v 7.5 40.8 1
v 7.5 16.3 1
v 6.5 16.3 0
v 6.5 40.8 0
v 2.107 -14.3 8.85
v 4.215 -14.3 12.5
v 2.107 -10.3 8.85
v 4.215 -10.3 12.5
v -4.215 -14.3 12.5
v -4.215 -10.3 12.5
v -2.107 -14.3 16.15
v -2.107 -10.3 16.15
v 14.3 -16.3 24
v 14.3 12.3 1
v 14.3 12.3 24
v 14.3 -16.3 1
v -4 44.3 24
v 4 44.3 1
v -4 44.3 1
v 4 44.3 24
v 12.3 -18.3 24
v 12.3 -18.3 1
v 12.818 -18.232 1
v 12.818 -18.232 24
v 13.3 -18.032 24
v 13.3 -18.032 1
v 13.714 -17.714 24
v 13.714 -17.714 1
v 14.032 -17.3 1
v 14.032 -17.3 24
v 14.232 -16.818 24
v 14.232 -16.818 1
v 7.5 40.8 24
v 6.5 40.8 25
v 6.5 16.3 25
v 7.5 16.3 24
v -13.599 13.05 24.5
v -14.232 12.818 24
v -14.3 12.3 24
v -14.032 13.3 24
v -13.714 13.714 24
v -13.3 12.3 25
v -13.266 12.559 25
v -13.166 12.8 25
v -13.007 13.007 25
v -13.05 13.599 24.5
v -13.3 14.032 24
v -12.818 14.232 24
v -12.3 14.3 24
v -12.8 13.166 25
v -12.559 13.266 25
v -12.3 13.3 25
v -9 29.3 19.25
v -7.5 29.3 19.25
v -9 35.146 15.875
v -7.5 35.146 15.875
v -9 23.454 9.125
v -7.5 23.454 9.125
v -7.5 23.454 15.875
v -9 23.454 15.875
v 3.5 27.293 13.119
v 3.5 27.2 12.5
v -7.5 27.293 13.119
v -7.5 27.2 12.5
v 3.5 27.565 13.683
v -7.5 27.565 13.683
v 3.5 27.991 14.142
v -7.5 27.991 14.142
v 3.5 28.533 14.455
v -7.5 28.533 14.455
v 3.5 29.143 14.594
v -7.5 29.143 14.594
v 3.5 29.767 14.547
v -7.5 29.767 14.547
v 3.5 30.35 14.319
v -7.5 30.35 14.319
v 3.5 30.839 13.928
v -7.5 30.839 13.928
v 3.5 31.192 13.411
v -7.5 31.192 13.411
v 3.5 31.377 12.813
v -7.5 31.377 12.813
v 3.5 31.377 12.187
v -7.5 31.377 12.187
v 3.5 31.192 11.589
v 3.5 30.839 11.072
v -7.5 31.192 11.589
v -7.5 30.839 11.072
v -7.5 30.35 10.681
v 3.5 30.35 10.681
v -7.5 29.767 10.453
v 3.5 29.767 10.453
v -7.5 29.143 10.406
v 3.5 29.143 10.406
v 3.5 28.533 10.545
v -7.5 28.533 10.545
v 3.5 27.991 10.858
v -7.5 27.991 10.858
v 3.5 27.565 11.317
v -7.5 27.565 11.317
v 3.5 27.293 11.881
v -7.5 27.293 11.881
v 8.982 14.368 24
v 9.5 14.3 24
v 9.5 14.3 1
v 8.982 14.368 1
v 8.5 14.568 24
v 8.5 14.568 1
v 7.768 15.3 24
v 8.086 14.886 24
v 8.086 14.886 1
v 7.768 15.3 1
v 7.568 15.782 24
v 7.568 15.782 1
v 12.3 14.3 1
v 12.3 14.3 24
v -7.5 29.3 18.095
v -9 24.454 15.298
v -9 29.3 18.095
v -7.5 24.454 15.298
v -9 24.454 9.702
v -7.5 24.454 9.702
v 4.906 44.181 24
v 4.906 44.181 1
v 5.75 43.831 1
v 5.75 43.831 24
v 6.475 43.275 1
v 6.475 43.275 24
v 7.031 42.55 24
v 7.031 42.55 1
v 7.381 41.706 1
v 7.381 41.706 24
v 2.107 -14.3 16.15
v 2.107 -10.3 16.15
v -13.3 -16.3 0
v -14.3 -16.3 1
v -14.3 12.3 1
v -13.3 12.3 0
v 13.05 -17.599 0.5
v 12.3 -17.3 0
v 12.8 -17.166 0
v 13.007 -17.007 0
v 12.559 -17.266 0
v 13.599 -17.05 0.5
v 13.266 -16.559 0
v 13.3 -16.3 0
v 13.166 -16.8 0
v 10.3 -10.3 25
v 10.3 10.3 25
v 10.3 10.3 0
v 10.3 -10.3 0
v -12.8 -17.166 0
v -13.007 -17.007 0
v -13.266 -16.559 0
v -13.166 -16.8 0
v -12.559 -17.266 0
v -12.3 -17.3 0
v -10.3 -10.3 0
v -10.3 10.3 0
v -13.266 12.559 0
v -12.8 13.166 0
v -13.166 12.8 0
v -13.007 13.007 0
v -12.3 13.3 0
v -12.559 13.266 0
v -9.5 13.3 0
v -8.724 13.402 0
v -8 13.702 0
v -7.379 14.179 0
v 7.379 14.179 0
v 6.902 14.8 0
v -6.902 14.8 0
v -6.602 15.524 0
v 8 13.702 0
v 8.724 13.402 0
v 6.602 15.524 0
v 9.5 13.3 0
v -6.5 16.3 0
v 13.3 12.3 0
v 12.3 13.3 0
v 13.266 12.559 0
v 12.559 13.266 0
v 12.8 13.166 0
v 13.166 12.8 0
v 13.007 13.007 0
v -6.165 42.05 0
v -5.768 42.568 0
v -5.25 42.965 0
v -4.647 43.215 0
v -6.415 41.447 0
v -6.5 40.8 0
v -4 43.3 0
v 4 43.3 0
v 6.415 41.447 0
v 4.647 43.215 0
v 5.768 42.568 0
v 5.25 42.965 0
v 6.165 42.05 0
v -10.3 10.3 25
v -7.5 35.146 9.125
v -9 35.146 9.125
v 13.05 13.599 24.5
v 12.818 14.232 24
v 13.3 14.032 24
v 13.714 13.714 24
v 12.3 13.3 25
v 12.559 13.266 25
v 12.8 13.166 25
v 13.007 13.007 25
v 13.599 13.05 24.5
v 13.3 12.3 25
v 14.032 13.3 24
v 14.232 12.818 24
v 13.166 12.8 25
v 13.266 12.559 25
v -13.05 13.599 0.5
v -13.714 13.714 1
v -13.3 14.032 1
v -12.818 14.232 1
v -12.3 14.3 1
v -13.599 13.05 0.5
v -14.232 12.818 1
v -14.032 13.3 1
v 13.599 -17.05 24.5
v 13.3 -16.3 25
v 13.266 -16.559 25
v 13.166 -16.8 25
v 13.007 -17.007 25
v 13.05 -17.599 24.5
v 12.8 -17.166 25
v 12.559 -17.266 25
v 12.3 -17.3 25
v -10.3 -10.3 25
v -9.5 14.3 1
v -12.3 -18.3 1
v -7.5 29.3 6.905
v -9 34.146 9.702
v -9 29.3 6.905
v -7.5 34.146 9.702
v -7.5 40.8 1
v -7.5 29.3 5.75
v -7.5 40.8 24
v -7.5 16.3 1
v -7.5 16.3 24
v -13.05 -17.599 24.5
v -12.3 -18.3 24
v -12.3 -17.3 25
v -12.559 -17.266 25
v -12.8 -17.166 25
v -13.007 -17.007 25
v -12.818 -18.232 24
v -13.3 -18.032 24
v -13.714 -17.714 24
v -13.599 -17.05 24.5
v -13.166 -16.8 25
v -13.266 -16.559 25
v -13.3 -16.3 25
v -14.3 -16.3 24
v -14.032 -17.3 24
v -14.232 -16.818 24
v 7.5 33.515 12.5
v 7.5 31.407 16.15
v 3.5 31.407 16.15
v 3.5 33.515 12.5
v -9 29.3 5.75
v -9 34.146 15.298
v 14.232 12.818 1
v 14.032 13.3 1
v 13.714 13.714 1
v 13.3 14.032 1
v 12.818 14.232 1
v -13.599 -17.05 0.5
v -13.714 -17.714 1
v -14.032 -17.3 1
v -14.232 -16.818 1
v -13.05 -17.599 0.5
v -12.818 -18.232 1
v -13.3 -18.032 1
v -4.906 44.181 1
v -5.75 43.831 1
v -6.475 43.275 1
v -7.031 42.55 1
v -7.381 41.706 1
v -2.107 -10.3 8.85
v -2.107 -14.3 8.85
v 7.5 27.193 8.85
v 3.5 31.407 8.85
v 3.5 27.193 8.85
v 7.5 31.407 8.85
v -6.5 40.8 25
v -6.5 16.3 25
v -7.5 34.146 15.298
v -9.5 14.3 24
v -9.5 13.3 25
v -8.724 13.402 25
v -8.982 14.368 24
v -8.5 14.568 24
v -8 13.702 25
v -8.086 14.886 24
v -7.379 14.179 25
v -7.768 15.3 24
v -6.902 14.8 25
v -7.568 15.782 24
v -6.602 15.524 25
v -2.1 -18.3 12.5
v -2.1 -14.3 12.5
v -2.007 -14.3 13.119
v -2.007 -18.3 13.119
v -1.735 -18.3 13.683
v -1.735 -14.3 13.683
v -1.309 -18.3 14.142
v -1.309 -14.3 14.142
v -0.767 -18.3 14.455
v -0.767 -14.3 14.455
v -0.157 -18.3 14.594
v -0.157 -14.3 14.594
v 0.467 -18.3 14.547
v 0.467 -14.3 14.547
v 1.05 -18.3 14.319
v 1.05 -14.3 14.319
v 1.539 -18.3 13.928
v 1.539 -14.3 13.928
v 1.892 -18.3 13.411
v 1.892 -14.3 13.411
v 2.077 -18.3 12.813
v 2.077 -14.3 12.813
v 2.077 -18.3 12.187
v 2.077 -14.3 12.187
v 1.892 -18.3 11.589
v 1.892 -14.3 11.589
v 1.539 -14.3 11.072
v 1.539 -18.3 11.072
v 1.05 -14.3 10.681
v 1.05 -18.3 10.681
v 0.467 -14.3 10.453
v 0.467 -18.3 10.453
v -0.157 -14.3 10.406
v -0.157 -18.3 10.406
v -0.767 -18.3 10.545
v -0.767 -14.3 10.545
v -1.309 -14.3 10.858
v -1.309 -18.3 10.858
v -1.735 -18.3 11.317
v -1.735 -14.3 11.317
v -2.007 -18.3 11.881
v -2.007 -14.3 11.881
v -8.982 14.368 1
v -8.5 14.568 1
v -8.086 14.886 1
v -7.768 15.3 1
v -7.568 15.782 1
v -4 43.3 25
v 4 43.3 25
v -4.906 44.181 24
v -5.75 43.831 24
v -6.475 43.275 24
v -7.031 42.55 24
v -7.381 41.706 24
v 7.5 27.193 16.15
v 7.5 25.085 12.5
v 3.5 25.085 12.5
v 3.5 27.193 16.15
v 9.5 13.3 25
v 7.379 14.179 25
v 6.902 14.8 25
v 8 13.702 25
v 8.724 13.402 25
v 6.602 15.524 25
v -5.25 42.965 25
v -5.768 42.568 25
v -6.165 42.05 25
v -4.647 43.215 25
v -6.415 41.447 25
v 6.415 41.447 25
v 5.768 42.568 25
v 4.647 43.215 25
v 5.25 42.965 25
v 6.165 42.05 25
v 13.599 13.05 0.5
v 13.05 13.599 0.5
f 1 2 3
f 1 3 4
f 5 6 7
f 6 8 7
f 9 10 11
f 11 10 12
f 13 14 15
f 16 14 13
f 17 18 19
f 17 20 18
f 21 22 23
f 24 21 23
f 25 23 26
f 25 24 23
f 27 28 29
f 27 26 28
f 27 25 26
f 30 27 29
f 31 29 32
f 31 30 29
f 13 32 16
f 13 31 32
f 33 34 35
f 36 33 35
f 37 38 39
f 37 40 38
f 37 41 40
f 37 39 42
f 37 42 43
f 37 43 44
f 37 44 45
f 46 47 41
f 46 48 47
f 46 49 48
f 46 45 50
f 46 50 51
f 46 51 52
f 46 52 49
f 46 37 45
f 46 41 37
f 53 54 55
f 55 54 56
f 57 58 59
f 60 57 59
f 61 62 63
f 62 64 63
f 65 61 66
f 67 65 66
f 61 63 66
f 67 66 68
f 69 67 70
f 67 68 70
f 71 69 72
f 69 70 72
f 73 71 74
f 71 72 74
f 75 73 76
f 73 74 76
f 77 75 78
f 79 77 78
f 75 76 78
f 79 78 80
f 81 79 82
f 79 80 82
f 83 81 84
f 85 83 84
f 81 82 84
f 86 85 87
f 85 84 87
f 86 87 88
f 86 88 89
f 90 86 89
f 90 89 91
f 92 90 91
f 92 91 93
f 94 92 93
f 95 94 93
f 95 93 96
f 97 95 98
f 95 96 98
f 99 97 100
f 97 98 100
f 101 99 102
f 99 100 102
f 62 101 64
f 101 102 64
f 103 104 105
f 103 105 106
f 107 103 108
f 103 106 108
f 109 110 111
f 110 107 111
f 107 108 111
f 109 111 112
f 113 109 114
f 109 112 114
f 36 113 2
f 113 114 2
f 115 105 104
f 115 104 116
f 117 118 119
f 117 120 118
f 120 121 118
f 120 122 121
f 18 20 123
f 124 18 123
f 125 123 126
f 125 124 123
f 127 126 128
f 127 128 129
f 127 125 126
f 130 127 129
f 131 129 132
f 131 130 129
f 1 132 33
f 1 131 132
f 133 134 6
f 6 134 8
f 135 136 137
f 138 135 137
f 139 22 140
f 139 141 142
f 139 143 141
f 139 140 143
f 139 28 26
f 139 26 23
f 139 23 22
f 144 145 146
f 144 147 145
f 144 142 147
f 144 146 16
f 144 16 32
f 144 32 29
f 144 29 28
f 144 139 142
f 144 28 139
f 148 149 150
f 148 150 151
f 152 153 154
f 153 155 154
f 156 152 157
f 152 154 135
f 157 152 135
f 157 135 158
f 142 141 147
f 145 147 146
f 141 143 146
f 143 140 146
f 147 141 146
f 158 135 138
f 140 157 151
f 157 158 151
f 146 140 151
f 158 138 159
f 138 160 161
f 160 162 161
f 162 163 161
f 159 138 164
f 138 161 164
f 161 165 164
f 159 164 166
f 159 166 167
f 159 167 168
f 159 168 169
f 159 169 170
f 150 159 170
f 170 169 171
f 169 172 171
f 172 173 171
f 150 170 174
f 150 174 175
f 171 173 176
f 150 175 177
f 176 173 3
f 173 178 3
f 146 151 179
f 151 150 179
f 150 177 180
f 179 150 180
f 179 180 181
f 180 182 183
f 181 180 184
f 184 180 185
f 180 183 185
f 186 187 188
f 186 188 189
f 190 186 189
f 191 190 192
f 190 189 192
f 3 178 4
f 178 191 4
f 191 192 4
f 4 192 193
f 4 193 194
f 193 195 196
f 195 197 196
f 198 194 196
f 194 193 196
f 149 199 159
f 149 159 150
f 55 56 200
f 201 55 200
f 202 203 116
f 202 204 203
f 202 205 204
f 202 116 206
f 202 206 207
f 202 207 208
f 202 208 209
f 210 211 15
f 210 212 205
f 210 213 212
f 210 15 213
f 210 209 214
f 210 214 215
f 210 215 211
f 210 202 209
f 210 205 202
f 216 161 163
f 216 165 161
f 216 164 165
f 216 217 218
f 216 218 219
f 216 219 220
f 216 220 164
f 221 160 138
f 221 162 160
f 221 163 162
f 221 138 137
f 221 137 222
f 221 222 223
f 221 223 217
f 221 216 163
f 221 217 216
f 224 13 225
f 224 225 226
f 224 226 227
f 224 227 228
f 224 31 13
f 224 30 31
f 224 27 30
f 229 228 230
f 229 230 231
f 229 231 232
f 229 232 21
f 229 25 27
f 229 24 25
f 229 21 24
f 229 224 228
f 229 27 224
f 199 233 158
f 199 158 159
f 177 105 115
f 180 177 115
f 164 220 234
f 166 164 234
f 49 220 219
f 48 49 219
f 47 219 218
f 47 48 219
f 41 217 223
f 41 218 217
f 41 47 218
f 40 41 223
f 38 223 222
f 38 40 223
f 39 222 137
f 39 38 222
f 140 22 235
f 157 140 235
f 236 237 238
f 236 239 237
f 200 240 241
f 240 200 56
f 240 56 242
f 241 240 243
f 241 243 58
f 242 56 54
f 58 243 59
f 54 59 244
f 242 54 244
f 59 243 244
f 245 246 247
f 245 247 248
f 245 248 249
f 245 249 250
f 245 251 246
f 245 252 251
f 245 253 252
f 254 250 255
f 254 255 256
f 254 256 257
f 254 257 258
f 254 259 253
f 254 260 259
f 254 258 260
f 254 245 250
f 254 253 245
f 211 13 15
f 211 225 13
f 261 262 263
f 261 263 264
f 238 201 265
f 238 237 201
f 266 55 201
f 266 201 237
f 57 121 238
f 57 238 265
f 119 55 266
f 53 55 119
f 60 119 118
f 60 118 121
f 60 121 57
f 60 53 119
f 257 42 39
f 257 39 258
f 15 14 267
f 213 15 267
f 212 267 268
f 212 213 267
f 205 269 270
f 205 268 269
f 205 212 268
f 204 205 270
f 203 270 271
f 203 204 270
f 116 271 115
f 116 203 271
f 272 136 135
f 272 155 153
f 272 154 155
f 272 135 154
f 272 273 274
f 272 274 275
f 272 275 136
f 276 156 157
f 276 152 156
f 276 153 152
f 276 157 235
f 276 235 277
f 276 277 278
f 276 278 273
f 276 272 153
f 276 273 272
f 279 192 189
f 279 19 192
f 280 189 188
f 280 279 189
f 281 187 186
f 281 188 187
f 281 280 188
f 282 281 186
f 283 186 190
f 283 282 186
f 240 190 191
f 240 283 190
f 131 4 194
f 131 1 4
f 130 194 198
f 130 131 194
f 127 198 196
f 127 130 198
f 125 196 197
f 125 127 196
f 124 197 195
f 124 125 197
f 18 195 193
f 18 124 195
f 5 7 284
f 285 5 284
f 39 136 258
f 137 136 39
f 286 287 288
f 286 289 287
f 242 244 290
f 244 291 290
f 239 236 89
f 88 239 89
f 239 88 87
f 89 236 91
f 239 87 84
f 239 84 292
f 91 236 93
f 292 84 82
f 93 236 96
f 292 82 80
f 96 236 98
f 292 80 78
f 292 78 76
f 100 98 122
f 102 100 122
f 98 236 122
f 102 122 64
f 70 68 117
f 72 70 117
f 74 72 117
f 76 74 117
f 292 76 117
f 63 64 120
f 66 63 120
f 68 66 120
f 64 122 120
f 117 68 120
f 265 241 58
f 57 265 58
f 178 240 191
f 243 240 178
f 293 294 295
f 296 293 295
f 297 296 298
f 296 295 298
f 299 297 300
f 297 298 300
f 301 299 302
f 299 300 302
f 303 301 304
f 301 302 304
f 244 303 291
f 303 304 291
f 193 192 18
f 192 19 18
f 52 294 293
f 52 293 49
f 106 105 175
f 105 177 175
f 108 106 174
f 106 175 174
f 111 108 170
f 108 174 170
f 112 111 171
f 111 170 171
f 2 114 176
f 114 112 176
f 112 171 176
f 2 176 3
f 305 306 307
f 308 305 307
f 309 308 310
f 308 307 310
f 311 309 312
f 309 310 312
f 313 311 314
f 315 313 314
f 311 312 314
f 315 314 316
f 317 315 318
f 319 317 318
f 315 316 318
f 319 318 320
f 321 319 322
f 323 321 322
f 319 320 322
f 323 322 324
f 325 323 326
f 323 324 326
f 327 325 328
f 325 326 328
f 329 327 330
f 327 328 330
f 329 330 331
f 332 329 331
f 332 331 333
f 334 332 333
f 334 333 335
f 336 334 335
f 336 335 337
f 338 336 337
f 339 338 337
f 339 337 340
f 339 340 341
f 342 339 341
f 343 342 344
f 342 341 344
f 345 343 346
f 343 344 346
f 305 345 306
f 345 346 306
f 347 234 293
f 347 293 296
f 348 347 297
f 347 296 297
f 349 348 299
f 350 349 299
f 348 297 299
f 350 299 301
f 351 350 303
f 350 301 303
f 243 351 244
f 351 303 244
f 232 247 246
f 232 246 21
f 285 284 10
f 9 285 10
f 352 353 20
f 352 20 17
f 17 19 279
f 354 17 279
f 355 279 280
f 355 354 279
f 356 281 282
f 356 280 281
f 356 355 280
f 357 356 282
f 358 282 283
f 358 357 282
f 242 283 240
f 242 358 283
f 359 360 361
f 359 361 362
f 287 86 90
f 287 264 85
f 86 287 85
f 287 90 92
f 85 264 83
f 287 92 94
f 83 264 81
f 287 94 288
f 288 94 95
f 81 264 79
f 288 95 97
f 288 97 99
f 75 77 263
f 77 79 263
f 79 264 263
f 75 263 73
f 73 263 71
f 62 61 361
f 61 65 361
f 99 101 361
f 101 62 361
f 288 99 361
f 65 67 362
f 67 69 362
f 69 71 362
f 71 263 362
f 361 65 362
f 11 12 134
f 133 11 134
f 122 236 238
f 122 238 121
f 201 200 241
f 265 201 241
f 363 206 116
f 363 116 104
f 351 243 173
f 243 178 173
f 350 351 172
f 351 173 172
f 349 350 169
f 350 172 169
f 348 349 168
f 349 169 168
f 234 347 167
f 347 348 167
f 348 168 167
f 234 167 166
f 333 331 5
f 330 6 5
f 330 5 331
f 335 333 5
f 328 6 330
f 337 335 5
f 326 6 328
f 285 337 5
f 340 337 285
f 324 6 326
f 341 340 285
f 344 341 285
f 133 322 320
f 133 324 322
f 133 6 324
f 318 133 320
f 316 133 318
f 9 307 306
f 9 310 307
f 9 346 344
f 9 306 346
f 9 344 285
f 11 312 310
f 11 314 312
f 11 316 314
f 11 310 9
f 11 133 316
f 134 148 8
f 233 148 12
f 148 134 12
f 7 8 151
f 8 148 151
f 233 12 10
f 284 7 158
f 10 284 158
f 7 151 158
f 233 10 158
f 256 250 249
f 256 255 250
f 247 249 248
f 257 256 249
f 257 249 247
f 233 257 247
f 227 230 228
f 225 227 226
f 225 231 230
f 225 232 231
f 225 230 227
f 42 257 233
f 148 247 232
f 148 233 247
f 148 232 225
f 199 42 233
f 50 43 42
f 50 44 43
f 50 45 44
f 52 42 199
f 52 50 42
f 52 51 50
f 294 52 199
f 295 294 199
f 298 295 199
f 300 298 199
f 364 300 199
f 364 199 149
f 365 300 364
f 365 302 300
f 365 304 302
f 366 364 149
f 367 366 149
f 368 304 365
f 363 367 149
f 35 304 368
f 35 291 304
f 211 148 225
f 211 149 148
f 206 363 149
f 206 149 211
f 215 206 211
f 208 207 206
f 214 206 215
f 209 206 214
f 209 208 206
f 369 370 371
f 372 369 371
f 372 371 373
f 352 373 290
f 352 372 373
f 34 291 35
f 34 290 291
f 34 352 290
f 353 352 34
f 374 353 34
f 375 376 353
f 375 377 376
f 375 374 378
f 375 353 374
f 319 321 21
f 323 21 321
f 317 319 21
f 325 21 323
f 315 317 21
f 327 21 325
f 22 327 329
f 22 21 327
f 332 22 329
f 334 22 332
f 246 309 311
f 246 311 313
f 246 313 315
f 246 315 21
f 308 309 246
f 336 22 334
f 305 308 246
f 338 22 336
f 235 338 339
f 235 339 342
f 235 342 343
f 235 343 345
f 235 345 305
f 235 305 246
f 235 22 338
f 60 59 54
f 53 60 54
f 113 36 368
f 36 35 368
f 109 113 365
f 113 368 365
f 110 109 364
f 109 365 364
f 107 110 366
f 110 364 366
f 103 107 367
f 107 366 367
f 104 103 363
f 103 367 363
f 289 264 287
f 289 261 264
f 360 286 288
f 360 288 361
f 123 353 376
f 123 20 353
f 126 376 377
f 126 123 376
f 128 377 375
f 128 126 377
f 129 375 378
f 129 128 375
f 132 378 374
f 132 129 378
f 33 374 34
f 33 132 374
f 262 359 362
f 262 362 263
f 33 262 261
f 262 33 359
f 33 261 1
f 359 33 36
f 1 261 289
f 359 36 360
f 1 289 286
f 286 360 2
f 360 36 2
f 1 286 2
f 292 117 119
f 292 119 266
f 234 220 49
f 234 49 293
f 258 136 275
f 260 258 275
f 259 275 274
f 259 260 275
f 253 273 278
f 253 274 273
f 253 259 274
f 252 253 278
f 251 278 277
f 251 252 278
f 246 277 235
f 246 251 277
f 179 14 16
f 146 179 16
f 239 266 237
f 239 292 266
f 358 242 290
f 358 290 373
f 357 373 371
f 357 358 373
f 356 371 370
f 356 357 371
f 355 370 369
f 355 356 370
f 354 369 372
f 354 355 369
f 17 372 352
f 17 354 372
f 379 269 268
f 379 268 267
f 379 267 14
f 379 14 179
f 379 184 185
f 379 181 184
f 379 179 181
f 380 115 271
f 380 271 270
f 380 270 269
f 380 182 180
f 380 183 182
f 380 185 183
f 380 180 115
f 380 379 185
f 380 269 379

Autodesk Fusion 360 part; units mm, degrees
sketch "Sketch1" plane through (0, 0, 0) normal (0, 0, 1) x (1, 0, 0)
  line L0 (10, -10) -> (-10, -10)
  line L1 (-10, -10) -> (-10, 10)
  line L2 (-10, 10) -> (10, 10)
  line L3 (10, 10) -> (10, -10)
  line L4 (10, -10) -> (-10, 10) construction
  line L5 (-10, -10) -> (10, 10) construction
  line L6 (10.3, -10.3) -> (-10.3, -10.3)
  line L7 (-10.3, -10.3) -> (-10.3, 10.3)
  line L8 (-10.3, 10.3) -> (10.3, 10.3)
  line L9 (10.3, 10.3) -> (10.3, -10.3)
  line L10 (-14.3, -14.3) -> (-14.3, 14.3)
  line L11 (-14.3, 14.3) -> (14.3, 14.3)
  line L12 (14.3, 14.3) -> (14.3, -14.3)
  line L13 (14.3, -14.3) -> (-14.3, -14.3)
  line L14 (-14.3, -14.3) -> (14.3, -14.3)
  line L15 (14.3, -14.3) -> (14.3, -18.3)
  line L16 (14.3, -18.3) -> (-14.3, -18.3)
  line L17 (-14.3, -18.3) -> (-14.3, -14.3)
  dimension "d1" = 20
  dimension "d2" = 20
  dimension "d3" = -0.3
  dimension "d4" = -4.3
  dimension "d10" = 28.6
  dimension "d11" = 4
extrude "Extrude1" add sketch "Sketch1" along normal blind 25 contours L10 L11 L12 L13 L14 | L13 L14 L15 L16 L17
sketch "Sketch3" plane through (0, -10.3, 0) normal (0, 1, 0) x (-1, 0, 0)
  line L0 (-10.3, 0) -> (10.3, 0)
  line L1 (10.3, 0) -> (10.3, 25)
  line L2 (10.3, 25) -> (-10.3, 25)
  line L3 (-10.3, 25) -> (-10.3, 0)
  line L4 (-10.3, 25) -> (10.3, 25)
  line L5 (10.3, 25) -> (10.3, 0)
  line L6 (10.3, 0) -> (-10.3, 0)
  line L7 (-10.3, 0) -> (-10.3, 25)
  line L8 (-10.3, 25) -> (10.3, 0) construction
  line L9 (10.3, 25) -> (-10.3, 0) construction
  line L10 (2.1073, 8.85) -> (4.2147, 12.5)
  line L11 (4.2147, 12.5) -> (2.1073, 16.15)
  line L12 (2.1073, 16.15) -> (-2.1073, 16.15)
  line L13 (-2.1073, 16.15) -> (-4.2147, 12.5)
  line L14 (-4.2147, 12.5) -> (-2.1073, 8.85)
  line L15 (-2.1073, 8.85) -> (2.1073, 8.85)
  circle A0 centre (0, 12.5) radius 2.1
  point P0 (0, 12.5)
  dimension "d12" = 25
  dimension "d13" = 3.65
  dimension "d16" = 4.2
extrude "Extrude4" cut sketch "Sketch3" against normal blind 8 contours A0
extrude "Extrude3" cut sketch "Sketch3" against normal blind 4 contours L10 L11 L12 L13 L14 L15 | A0
sketch "Sketch6" plane through (0, 14.3, 0) normal (0, 1, 0) x (-1, 0, 0)
  line L0 (-14.3, 0) -> (14.3, 0)
  line L1 (14.3, 0) -> (14.3, 25)
  line L2 (14.3, 25) -> (-14.3, 25)
  line L3 (-14.3, 25) -> (-14.3, 0)
  line L4 (-14.3, 25) -> (14.3, 0) construction
  line L5 (14.3, 25) -> (-14.3, 0) construction
  line L6 (7.5, 25) -> (-7.5, 25)
  line L7 (-7.5, 25) -> (-7.5, 0)
  line L8 (-7.5, 0) -> (7.5, 0)
  line L9 (7.5, 0) -> (7.5, 25)
  line L10 (7.5, 25) -> (-7.5, 0) construction
  line L11 (-7.5, 25) -> (7.5, 0) construction
  point P0 (0, 12.5)
  dimension "d35" = 15
  dimension "d36" = 25
extrude "Extrude10" add sketch "Sketch6" along normal blind 30 contours L0 L2 L6 L7 L8 L9
sketch "Sketch7" plane through (-7.5, 0, 0) normal (-1, 0, 0) x (0, -1, 0)
  line L0 (-14.3, 0) -> (-14.3, 25)
  line L1 (-14.3, 25) -> (-44.3, 25)
  line L2 (-44.3, 25) -> (-44.3, 0)
  line L3 (-44.3, 0) -> (-14.3, 0)
  line L4 (-14.3, 25) -> (-44.3, 0) construction
  line L5 (-44.3, 25) -> (-14.3, 0) construction
  circle A0 centre (-29.3, 12.5) radius 2.1
  line L6 (-27.1927, 8.85) -> (-25.0853, 12.5)
  line L7 (-25.0853, 12.5) -> (-27.1927, 16.15)
  line L8 (-27.1927, 16.15) -> (-31.4073, 16.15)
  line L9 (-31.4073, 16.15) -> (-33.5147, 12.5)
  line L10 (-33.5147, 12.5) -> (-31.4073, 8.85)
  line L11 (-31.4073, 8.85) -> (-27.1927, 8.85)
  line L12 (-29.3, 5.75) -> (-23.4543, 9.125)
  line L13 (-23.4543, 9.125) -> (-23.4543, 15.875)
  line L14 (-23.4543, 15.875) -> (-29.3, 19.25)
  line L15 (-29.3, 19.25) -> (-35.1457, 15.875)
  line L16 (-35.1457, 15.875) -> (-35.1457, 9.125)
  line L17 (-35.1457, 9.125) -> (-29.3, 5.75)
  line L18 (-24.4543, 15.2976) -> (-29.3, 18.0953)
  line L19 (-29.3, 18.0953) -> (-34.1457, 15.2976)
  line L20 (-34.1457, 15.2976) -> (-34.1457, 9.7024)
  line L21 (-34.1457, 9.7024) -> (-29.3, 6.9047)
  line L22 (-29.3, 6.9047) -> (-24.4543, 9.7024)
  line L23 (-24.4543, 9.7024) -> (-24.4543, 15.2976)
  point P0 (-29.3, 12.5)
  point P1 (-29.3, 12.5)
  point P2 (-29.3, 12.5)
  dimension "d43" = 4.2
  dimension "d50" = 3.65
  dimension "d54" = 6.75
  dimension "d55" = -1
extrude "Extrude13" cut sketch "Sketch7" along normal blind 4 from surface at -15 contours L6 L7 L8 L9 L10 L11
extrude "Extrude12" cut sketch "Sketch7" against normal blind 15 contours A0
extrude "Extrude11" add sketch "Sketch7" along normal blind 1.5 contours L12 L13 L14 L15 L16 L17
fillet "Fillet1" radius 3.5 2 edges at (-7.5, 44.3, 12.5) (7.5, 44.3, 12.5)
fillet "Fillet2" radius 2 2 edges at (-7.5, 14.3, 12.5) (7.5, 14.3, 12.5)
fillet "Fillet3" radius 2 4 edges at (-14.3, 14.3, 12.5) (-14.3, -18.3, 12.5) (14.3, -18.3, 12.5) (14.3, 14.3, 12.5)
chamfer "Chamfer1" distance 1 angle 45 32 edges at (-13.7142, -17.7142, 25) (0, -18.3, 25) (13.7142, -17.7142, 25) (14.3, -2, 25) (13.7142, 13.7142, 25) (10.9, 14.3, 25) (8.0858, 14.8858, 25) (7.5, 28.55, 25) (6.4749, 43.2749, 25) (0, 44.3, 25) (-6.4749, 43.2749, 25) (-7.5, 28.55, 25) (-8.0858, 14.8858, 25) (-10.9, 14.3, 25) (-13.7142, 13.7142, 25) (-14.3, -2, 25) (-13.7142, 13.7142, 0) (-10.9, 14.3, 0) (-8.0858, 14.8858, 0) (-7.5, 28.55, 0) (-6.4749, 43.2749, 0) (0, 44.3, 0) (6.4749, 43.2749, 0) (7.5, 28.55, 0) (8.0858, 14.8858, 0) (10.9, 14.3, 0) (13.7142, 13.7142, 0) (14.3, -2, 0) (13.7142, -17.7142, 0) (0, -18.3, 0) (-13.7142, -17.7142, 0) (-14.3, -2, 0)
equation "d35 = 28.6 mm - 4 mm - 4 mm - 0.6 mm - 5 mm"
equation "d54 = ( 13.5 / 2 ) * 1 mm"
